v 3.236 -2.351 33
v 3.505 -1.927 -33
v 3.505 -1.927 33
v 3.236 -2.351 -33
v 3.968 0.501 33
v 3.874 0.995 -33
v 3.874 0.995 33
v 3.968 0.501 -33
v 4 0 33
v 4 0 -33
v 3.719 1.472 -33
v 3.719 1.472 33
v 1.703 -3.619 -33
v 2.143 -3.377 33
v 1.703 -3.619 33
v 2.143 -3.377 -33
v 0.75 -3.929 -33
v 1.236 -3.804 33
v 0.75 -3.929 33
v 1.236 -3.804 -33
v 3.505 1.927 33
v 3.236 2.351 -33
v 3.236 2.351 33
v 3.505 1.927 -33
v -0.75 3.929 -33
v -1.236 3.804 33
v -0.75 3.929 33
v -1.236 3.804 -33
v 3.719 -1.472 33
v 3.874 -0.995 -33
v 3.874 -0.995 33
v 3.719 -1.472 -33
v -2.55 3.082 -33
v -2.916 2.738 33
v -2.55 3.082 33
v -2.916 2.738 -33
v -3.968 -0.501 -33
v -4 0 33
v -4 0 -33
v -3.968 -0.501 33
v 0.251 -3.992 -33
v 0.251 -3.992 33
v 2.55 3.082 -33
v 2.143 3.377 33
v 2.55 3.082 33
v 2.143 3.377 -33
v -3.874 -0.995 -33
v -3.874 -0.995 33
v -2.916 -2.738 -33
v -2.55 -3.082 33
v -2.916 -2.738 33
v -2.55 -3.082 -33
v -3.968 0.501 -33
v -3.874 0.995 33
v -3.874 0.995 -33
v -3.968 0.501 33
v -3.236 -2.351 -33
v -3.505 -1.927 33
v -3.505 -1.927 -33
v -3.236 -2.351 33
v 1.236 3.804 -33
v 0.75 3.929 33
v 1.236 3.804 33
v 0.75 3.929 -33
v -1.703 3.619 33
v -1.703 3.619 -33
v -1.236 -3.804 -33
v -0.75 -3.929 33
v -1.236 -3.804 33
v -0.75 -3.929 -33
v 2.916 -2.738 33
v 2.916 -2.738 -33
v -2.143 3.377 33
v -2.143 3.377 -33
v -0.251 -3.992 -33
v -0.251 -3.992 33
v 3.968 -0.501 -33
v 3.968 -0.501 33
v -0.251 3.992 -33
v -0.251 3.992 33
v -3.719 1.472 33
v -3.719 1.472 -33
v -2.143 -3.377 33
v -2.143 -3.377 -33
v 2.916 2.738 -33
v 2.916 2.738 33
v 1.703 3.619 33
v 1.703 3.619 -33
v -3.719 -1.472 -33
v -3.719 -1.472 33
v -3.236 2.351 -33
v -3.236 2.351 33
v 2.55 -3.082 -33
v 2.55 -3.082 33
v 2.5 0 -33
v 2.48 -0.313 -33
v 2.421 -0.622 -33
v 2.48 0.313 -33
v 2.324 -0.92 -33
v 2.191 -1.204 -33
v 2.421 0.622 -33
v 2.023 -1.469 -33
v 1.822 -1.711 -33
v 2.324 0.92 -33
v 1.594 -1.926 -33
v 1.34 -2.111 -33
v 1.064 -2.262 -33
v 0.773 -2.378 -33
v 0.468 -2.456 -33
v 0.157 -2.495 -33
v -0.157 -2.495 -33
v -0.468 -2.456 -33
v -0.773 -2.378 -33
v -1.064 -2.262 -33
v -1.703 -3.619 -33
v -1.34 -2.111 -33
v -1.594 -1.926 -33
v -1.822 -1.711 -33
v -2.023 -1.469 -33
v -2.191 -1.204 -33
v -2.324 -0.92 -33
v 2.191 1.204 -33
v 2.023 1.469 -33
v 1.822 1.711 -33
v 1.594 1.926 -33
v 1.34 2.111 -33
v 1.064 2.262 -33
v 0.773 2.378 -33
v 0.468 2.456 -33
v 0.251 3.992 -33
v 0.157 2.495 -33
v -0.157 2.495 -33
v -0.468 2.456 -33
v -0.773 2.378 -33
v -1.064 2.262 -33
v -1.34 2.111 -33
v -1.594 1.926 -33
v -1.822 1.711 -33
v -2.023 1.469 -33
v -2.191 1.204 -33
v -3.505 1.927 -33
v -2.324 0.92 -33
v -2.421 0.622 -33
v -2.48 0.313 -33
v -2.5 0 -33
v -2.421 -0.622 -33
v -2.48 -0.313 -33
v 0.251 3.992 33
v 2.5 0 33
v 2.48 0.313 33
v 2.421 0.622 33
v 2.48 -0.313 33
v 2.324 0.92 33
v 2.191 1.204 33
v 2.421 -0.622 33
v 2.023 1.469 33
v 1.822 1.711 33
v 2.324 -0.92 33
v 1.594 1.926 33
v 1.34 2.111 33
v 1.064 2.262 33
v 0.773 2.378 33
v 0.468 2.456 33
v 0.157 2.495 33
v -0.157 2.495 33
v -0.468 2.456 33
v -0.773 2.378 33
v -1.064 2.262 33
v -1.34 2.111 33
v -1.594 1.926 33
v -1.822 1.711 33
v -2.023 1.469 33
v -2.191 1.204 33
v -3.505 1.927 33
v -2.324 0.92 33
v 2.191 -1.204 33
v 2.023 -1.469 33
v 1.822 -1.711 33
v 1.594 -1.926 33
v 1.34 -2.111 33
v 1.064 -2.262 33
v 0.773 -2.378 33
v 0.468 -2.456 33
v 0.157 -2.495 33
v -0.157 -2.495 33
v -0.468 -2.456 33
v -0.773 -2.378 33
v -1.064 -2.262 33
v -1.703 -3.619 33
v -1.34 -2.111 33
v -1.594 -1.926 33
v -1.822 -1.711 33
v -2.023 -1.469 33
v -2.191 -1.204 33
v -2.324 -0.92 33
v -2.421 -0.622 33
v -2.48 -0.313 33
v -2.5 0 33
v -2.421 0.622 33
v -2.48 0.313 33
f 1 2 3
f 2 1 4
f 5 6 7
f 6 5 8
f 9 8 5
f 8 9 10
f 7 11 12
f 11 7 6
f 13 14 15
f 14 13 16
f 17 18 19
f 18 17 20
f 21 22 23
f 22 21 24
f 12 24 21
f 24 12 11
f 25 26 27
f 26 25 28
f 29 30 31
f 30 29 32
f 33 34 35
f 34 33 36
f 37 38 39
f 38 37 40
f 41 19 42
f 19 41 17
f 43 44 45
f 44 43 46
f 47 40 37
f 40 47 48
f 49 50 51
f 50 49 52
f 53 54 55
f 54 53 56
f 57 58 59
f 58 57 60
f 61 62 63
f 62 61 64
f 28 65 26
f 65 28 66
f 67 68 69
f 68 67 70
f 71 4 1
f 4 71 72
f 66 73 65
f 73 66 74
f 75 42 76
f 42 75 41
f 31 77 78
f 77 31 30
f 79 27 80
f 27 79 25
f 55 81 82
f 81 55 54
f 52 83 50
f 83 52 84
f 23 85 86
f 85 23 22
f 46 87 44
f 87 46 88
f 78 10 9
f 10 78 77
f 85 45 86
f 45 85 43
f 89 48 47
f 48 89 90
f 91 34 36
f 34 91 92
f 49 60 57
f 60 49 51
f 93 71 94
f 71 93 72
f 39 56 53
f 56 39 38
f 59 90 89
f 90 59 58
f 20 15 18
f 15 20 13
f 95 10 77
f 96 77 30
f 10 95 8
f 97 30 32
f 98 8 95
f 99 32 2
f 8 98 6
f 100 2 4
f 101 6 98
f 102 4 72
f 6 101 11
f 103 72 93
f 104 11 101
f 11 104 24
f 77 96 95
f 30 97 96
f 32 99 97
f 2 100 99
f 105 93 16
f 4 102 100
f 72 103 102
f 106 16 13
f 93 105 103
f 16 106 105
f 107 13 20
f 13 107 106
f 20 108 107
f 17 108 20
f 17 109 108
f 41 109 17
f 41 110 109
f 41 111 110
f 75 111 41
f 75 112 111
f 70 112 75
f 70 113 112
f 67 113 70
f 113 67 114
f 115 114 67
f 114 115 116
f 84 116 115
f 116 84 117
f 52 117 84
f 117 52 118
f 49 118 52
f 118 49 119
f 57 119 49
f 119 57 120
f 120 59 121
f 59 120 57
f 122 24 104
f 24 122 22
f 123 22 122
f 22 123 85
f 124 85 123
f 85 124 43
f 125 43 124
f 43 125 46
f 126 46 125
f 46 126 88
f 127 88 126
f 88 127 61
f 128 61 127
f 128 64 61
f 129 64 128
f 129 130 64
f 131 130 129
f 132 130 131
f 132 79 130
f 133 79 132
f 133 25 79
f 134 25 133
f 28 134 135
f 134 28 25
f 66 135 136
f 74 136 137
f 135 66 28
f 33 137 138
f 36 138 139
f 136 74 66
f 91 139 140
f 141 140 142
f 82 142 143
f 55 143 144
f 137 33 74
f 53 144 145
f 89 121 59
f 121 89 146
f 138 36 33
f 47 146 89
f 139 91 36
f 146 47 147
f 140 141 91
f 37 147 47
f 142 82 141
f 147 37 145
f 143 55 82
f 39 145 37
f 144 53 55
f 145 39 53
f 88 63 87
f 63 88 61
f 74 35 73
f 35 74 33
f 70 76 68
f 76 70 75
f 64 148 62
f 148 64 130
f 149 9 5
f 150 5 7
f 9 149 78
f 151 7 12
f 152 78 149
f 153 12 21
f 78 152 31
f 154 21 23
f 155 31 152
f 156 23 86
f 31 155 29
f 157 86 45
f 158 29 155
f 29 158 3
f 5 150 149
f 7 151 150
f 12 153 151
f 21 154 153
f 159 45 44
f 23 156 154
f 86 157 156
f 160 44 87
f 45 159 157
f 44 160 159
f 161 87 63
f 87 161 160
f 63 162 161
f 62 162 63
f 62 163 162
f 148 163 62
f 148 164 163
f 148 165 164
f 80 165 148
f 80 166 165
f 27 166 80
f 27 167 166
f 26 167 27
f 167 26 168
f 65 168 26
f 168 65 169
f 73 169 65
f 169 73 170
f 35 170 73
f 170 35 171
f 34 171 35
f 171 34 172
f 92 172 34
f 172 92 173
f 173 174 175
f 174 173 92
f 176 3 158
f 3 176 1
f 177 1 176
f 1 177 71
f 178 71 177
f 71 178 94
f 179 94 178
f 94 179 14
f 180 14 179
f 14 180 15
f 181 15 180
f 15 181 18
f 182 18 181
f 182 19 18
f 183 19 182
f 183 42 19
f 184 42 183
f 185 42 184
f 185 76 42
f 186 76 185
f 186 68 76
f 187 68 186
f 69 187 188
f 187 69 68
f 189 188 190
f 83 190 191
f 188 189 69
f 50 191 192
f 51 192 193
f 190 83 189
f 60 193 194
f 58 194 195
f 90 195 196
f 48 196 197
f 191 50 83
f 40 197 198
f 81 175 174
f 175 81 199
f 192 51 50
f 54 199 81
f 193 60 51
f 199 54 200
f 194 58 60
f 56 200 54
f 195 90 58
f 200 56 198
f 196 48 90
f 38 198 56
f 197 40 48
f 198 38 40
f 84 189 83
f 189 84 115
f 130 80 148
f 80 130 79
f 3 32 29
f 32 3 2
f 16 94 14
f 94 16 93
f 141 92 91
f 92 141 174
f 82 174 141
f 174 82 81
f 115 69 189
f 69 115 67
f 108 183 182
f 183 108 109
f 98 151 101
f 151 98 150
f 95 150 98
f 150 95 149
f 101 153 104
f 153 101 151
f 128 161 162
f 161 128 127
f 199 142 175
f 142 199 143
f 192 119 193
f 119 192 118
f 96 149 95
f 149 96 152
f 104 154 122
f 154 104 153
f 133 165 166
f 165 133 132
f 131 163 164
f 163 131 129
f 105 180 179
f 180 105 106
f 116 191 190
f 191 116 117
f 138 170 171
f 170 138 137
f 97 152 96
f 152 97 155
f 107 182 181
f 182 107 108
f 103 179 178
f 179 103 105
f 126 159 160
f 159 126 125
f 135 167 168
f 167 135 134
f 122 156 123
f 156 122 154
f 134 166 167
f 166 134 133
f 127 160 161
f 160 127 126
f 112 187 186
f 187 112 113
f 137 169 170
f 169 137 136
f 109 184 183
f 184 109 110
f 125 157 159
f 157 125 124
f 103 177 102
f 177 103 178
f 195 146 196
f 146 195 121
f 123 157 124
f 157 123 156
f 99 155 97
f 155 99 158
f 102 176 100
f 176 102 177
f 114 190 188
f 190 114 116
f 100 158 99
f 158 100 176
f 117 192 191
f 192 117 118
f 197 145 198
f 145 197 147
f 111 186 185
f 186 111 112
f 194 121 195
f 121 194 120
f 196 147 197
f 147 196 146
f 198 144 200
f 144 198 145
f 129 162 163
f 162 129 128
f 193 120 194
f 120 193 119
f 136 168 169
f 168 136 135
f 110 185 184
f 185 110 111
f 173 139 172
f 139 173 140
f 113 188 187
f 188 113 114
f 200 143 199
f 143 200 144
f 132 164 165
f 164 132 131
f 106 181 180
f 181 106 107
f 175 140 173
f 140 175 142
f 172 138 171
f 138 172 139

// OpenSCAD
$fn = 50;


difference() {
	union() {
		translate(v = [0, 0, -33.0000000000]) {
			cylinder(h = 66, r = 4.0000000000);
		}
	}
	union() {
		translate(v = [0, 0, -100.0000000000]) {
			cylinder(h = 200, r = 2.5000000000);
		}
	}
}
